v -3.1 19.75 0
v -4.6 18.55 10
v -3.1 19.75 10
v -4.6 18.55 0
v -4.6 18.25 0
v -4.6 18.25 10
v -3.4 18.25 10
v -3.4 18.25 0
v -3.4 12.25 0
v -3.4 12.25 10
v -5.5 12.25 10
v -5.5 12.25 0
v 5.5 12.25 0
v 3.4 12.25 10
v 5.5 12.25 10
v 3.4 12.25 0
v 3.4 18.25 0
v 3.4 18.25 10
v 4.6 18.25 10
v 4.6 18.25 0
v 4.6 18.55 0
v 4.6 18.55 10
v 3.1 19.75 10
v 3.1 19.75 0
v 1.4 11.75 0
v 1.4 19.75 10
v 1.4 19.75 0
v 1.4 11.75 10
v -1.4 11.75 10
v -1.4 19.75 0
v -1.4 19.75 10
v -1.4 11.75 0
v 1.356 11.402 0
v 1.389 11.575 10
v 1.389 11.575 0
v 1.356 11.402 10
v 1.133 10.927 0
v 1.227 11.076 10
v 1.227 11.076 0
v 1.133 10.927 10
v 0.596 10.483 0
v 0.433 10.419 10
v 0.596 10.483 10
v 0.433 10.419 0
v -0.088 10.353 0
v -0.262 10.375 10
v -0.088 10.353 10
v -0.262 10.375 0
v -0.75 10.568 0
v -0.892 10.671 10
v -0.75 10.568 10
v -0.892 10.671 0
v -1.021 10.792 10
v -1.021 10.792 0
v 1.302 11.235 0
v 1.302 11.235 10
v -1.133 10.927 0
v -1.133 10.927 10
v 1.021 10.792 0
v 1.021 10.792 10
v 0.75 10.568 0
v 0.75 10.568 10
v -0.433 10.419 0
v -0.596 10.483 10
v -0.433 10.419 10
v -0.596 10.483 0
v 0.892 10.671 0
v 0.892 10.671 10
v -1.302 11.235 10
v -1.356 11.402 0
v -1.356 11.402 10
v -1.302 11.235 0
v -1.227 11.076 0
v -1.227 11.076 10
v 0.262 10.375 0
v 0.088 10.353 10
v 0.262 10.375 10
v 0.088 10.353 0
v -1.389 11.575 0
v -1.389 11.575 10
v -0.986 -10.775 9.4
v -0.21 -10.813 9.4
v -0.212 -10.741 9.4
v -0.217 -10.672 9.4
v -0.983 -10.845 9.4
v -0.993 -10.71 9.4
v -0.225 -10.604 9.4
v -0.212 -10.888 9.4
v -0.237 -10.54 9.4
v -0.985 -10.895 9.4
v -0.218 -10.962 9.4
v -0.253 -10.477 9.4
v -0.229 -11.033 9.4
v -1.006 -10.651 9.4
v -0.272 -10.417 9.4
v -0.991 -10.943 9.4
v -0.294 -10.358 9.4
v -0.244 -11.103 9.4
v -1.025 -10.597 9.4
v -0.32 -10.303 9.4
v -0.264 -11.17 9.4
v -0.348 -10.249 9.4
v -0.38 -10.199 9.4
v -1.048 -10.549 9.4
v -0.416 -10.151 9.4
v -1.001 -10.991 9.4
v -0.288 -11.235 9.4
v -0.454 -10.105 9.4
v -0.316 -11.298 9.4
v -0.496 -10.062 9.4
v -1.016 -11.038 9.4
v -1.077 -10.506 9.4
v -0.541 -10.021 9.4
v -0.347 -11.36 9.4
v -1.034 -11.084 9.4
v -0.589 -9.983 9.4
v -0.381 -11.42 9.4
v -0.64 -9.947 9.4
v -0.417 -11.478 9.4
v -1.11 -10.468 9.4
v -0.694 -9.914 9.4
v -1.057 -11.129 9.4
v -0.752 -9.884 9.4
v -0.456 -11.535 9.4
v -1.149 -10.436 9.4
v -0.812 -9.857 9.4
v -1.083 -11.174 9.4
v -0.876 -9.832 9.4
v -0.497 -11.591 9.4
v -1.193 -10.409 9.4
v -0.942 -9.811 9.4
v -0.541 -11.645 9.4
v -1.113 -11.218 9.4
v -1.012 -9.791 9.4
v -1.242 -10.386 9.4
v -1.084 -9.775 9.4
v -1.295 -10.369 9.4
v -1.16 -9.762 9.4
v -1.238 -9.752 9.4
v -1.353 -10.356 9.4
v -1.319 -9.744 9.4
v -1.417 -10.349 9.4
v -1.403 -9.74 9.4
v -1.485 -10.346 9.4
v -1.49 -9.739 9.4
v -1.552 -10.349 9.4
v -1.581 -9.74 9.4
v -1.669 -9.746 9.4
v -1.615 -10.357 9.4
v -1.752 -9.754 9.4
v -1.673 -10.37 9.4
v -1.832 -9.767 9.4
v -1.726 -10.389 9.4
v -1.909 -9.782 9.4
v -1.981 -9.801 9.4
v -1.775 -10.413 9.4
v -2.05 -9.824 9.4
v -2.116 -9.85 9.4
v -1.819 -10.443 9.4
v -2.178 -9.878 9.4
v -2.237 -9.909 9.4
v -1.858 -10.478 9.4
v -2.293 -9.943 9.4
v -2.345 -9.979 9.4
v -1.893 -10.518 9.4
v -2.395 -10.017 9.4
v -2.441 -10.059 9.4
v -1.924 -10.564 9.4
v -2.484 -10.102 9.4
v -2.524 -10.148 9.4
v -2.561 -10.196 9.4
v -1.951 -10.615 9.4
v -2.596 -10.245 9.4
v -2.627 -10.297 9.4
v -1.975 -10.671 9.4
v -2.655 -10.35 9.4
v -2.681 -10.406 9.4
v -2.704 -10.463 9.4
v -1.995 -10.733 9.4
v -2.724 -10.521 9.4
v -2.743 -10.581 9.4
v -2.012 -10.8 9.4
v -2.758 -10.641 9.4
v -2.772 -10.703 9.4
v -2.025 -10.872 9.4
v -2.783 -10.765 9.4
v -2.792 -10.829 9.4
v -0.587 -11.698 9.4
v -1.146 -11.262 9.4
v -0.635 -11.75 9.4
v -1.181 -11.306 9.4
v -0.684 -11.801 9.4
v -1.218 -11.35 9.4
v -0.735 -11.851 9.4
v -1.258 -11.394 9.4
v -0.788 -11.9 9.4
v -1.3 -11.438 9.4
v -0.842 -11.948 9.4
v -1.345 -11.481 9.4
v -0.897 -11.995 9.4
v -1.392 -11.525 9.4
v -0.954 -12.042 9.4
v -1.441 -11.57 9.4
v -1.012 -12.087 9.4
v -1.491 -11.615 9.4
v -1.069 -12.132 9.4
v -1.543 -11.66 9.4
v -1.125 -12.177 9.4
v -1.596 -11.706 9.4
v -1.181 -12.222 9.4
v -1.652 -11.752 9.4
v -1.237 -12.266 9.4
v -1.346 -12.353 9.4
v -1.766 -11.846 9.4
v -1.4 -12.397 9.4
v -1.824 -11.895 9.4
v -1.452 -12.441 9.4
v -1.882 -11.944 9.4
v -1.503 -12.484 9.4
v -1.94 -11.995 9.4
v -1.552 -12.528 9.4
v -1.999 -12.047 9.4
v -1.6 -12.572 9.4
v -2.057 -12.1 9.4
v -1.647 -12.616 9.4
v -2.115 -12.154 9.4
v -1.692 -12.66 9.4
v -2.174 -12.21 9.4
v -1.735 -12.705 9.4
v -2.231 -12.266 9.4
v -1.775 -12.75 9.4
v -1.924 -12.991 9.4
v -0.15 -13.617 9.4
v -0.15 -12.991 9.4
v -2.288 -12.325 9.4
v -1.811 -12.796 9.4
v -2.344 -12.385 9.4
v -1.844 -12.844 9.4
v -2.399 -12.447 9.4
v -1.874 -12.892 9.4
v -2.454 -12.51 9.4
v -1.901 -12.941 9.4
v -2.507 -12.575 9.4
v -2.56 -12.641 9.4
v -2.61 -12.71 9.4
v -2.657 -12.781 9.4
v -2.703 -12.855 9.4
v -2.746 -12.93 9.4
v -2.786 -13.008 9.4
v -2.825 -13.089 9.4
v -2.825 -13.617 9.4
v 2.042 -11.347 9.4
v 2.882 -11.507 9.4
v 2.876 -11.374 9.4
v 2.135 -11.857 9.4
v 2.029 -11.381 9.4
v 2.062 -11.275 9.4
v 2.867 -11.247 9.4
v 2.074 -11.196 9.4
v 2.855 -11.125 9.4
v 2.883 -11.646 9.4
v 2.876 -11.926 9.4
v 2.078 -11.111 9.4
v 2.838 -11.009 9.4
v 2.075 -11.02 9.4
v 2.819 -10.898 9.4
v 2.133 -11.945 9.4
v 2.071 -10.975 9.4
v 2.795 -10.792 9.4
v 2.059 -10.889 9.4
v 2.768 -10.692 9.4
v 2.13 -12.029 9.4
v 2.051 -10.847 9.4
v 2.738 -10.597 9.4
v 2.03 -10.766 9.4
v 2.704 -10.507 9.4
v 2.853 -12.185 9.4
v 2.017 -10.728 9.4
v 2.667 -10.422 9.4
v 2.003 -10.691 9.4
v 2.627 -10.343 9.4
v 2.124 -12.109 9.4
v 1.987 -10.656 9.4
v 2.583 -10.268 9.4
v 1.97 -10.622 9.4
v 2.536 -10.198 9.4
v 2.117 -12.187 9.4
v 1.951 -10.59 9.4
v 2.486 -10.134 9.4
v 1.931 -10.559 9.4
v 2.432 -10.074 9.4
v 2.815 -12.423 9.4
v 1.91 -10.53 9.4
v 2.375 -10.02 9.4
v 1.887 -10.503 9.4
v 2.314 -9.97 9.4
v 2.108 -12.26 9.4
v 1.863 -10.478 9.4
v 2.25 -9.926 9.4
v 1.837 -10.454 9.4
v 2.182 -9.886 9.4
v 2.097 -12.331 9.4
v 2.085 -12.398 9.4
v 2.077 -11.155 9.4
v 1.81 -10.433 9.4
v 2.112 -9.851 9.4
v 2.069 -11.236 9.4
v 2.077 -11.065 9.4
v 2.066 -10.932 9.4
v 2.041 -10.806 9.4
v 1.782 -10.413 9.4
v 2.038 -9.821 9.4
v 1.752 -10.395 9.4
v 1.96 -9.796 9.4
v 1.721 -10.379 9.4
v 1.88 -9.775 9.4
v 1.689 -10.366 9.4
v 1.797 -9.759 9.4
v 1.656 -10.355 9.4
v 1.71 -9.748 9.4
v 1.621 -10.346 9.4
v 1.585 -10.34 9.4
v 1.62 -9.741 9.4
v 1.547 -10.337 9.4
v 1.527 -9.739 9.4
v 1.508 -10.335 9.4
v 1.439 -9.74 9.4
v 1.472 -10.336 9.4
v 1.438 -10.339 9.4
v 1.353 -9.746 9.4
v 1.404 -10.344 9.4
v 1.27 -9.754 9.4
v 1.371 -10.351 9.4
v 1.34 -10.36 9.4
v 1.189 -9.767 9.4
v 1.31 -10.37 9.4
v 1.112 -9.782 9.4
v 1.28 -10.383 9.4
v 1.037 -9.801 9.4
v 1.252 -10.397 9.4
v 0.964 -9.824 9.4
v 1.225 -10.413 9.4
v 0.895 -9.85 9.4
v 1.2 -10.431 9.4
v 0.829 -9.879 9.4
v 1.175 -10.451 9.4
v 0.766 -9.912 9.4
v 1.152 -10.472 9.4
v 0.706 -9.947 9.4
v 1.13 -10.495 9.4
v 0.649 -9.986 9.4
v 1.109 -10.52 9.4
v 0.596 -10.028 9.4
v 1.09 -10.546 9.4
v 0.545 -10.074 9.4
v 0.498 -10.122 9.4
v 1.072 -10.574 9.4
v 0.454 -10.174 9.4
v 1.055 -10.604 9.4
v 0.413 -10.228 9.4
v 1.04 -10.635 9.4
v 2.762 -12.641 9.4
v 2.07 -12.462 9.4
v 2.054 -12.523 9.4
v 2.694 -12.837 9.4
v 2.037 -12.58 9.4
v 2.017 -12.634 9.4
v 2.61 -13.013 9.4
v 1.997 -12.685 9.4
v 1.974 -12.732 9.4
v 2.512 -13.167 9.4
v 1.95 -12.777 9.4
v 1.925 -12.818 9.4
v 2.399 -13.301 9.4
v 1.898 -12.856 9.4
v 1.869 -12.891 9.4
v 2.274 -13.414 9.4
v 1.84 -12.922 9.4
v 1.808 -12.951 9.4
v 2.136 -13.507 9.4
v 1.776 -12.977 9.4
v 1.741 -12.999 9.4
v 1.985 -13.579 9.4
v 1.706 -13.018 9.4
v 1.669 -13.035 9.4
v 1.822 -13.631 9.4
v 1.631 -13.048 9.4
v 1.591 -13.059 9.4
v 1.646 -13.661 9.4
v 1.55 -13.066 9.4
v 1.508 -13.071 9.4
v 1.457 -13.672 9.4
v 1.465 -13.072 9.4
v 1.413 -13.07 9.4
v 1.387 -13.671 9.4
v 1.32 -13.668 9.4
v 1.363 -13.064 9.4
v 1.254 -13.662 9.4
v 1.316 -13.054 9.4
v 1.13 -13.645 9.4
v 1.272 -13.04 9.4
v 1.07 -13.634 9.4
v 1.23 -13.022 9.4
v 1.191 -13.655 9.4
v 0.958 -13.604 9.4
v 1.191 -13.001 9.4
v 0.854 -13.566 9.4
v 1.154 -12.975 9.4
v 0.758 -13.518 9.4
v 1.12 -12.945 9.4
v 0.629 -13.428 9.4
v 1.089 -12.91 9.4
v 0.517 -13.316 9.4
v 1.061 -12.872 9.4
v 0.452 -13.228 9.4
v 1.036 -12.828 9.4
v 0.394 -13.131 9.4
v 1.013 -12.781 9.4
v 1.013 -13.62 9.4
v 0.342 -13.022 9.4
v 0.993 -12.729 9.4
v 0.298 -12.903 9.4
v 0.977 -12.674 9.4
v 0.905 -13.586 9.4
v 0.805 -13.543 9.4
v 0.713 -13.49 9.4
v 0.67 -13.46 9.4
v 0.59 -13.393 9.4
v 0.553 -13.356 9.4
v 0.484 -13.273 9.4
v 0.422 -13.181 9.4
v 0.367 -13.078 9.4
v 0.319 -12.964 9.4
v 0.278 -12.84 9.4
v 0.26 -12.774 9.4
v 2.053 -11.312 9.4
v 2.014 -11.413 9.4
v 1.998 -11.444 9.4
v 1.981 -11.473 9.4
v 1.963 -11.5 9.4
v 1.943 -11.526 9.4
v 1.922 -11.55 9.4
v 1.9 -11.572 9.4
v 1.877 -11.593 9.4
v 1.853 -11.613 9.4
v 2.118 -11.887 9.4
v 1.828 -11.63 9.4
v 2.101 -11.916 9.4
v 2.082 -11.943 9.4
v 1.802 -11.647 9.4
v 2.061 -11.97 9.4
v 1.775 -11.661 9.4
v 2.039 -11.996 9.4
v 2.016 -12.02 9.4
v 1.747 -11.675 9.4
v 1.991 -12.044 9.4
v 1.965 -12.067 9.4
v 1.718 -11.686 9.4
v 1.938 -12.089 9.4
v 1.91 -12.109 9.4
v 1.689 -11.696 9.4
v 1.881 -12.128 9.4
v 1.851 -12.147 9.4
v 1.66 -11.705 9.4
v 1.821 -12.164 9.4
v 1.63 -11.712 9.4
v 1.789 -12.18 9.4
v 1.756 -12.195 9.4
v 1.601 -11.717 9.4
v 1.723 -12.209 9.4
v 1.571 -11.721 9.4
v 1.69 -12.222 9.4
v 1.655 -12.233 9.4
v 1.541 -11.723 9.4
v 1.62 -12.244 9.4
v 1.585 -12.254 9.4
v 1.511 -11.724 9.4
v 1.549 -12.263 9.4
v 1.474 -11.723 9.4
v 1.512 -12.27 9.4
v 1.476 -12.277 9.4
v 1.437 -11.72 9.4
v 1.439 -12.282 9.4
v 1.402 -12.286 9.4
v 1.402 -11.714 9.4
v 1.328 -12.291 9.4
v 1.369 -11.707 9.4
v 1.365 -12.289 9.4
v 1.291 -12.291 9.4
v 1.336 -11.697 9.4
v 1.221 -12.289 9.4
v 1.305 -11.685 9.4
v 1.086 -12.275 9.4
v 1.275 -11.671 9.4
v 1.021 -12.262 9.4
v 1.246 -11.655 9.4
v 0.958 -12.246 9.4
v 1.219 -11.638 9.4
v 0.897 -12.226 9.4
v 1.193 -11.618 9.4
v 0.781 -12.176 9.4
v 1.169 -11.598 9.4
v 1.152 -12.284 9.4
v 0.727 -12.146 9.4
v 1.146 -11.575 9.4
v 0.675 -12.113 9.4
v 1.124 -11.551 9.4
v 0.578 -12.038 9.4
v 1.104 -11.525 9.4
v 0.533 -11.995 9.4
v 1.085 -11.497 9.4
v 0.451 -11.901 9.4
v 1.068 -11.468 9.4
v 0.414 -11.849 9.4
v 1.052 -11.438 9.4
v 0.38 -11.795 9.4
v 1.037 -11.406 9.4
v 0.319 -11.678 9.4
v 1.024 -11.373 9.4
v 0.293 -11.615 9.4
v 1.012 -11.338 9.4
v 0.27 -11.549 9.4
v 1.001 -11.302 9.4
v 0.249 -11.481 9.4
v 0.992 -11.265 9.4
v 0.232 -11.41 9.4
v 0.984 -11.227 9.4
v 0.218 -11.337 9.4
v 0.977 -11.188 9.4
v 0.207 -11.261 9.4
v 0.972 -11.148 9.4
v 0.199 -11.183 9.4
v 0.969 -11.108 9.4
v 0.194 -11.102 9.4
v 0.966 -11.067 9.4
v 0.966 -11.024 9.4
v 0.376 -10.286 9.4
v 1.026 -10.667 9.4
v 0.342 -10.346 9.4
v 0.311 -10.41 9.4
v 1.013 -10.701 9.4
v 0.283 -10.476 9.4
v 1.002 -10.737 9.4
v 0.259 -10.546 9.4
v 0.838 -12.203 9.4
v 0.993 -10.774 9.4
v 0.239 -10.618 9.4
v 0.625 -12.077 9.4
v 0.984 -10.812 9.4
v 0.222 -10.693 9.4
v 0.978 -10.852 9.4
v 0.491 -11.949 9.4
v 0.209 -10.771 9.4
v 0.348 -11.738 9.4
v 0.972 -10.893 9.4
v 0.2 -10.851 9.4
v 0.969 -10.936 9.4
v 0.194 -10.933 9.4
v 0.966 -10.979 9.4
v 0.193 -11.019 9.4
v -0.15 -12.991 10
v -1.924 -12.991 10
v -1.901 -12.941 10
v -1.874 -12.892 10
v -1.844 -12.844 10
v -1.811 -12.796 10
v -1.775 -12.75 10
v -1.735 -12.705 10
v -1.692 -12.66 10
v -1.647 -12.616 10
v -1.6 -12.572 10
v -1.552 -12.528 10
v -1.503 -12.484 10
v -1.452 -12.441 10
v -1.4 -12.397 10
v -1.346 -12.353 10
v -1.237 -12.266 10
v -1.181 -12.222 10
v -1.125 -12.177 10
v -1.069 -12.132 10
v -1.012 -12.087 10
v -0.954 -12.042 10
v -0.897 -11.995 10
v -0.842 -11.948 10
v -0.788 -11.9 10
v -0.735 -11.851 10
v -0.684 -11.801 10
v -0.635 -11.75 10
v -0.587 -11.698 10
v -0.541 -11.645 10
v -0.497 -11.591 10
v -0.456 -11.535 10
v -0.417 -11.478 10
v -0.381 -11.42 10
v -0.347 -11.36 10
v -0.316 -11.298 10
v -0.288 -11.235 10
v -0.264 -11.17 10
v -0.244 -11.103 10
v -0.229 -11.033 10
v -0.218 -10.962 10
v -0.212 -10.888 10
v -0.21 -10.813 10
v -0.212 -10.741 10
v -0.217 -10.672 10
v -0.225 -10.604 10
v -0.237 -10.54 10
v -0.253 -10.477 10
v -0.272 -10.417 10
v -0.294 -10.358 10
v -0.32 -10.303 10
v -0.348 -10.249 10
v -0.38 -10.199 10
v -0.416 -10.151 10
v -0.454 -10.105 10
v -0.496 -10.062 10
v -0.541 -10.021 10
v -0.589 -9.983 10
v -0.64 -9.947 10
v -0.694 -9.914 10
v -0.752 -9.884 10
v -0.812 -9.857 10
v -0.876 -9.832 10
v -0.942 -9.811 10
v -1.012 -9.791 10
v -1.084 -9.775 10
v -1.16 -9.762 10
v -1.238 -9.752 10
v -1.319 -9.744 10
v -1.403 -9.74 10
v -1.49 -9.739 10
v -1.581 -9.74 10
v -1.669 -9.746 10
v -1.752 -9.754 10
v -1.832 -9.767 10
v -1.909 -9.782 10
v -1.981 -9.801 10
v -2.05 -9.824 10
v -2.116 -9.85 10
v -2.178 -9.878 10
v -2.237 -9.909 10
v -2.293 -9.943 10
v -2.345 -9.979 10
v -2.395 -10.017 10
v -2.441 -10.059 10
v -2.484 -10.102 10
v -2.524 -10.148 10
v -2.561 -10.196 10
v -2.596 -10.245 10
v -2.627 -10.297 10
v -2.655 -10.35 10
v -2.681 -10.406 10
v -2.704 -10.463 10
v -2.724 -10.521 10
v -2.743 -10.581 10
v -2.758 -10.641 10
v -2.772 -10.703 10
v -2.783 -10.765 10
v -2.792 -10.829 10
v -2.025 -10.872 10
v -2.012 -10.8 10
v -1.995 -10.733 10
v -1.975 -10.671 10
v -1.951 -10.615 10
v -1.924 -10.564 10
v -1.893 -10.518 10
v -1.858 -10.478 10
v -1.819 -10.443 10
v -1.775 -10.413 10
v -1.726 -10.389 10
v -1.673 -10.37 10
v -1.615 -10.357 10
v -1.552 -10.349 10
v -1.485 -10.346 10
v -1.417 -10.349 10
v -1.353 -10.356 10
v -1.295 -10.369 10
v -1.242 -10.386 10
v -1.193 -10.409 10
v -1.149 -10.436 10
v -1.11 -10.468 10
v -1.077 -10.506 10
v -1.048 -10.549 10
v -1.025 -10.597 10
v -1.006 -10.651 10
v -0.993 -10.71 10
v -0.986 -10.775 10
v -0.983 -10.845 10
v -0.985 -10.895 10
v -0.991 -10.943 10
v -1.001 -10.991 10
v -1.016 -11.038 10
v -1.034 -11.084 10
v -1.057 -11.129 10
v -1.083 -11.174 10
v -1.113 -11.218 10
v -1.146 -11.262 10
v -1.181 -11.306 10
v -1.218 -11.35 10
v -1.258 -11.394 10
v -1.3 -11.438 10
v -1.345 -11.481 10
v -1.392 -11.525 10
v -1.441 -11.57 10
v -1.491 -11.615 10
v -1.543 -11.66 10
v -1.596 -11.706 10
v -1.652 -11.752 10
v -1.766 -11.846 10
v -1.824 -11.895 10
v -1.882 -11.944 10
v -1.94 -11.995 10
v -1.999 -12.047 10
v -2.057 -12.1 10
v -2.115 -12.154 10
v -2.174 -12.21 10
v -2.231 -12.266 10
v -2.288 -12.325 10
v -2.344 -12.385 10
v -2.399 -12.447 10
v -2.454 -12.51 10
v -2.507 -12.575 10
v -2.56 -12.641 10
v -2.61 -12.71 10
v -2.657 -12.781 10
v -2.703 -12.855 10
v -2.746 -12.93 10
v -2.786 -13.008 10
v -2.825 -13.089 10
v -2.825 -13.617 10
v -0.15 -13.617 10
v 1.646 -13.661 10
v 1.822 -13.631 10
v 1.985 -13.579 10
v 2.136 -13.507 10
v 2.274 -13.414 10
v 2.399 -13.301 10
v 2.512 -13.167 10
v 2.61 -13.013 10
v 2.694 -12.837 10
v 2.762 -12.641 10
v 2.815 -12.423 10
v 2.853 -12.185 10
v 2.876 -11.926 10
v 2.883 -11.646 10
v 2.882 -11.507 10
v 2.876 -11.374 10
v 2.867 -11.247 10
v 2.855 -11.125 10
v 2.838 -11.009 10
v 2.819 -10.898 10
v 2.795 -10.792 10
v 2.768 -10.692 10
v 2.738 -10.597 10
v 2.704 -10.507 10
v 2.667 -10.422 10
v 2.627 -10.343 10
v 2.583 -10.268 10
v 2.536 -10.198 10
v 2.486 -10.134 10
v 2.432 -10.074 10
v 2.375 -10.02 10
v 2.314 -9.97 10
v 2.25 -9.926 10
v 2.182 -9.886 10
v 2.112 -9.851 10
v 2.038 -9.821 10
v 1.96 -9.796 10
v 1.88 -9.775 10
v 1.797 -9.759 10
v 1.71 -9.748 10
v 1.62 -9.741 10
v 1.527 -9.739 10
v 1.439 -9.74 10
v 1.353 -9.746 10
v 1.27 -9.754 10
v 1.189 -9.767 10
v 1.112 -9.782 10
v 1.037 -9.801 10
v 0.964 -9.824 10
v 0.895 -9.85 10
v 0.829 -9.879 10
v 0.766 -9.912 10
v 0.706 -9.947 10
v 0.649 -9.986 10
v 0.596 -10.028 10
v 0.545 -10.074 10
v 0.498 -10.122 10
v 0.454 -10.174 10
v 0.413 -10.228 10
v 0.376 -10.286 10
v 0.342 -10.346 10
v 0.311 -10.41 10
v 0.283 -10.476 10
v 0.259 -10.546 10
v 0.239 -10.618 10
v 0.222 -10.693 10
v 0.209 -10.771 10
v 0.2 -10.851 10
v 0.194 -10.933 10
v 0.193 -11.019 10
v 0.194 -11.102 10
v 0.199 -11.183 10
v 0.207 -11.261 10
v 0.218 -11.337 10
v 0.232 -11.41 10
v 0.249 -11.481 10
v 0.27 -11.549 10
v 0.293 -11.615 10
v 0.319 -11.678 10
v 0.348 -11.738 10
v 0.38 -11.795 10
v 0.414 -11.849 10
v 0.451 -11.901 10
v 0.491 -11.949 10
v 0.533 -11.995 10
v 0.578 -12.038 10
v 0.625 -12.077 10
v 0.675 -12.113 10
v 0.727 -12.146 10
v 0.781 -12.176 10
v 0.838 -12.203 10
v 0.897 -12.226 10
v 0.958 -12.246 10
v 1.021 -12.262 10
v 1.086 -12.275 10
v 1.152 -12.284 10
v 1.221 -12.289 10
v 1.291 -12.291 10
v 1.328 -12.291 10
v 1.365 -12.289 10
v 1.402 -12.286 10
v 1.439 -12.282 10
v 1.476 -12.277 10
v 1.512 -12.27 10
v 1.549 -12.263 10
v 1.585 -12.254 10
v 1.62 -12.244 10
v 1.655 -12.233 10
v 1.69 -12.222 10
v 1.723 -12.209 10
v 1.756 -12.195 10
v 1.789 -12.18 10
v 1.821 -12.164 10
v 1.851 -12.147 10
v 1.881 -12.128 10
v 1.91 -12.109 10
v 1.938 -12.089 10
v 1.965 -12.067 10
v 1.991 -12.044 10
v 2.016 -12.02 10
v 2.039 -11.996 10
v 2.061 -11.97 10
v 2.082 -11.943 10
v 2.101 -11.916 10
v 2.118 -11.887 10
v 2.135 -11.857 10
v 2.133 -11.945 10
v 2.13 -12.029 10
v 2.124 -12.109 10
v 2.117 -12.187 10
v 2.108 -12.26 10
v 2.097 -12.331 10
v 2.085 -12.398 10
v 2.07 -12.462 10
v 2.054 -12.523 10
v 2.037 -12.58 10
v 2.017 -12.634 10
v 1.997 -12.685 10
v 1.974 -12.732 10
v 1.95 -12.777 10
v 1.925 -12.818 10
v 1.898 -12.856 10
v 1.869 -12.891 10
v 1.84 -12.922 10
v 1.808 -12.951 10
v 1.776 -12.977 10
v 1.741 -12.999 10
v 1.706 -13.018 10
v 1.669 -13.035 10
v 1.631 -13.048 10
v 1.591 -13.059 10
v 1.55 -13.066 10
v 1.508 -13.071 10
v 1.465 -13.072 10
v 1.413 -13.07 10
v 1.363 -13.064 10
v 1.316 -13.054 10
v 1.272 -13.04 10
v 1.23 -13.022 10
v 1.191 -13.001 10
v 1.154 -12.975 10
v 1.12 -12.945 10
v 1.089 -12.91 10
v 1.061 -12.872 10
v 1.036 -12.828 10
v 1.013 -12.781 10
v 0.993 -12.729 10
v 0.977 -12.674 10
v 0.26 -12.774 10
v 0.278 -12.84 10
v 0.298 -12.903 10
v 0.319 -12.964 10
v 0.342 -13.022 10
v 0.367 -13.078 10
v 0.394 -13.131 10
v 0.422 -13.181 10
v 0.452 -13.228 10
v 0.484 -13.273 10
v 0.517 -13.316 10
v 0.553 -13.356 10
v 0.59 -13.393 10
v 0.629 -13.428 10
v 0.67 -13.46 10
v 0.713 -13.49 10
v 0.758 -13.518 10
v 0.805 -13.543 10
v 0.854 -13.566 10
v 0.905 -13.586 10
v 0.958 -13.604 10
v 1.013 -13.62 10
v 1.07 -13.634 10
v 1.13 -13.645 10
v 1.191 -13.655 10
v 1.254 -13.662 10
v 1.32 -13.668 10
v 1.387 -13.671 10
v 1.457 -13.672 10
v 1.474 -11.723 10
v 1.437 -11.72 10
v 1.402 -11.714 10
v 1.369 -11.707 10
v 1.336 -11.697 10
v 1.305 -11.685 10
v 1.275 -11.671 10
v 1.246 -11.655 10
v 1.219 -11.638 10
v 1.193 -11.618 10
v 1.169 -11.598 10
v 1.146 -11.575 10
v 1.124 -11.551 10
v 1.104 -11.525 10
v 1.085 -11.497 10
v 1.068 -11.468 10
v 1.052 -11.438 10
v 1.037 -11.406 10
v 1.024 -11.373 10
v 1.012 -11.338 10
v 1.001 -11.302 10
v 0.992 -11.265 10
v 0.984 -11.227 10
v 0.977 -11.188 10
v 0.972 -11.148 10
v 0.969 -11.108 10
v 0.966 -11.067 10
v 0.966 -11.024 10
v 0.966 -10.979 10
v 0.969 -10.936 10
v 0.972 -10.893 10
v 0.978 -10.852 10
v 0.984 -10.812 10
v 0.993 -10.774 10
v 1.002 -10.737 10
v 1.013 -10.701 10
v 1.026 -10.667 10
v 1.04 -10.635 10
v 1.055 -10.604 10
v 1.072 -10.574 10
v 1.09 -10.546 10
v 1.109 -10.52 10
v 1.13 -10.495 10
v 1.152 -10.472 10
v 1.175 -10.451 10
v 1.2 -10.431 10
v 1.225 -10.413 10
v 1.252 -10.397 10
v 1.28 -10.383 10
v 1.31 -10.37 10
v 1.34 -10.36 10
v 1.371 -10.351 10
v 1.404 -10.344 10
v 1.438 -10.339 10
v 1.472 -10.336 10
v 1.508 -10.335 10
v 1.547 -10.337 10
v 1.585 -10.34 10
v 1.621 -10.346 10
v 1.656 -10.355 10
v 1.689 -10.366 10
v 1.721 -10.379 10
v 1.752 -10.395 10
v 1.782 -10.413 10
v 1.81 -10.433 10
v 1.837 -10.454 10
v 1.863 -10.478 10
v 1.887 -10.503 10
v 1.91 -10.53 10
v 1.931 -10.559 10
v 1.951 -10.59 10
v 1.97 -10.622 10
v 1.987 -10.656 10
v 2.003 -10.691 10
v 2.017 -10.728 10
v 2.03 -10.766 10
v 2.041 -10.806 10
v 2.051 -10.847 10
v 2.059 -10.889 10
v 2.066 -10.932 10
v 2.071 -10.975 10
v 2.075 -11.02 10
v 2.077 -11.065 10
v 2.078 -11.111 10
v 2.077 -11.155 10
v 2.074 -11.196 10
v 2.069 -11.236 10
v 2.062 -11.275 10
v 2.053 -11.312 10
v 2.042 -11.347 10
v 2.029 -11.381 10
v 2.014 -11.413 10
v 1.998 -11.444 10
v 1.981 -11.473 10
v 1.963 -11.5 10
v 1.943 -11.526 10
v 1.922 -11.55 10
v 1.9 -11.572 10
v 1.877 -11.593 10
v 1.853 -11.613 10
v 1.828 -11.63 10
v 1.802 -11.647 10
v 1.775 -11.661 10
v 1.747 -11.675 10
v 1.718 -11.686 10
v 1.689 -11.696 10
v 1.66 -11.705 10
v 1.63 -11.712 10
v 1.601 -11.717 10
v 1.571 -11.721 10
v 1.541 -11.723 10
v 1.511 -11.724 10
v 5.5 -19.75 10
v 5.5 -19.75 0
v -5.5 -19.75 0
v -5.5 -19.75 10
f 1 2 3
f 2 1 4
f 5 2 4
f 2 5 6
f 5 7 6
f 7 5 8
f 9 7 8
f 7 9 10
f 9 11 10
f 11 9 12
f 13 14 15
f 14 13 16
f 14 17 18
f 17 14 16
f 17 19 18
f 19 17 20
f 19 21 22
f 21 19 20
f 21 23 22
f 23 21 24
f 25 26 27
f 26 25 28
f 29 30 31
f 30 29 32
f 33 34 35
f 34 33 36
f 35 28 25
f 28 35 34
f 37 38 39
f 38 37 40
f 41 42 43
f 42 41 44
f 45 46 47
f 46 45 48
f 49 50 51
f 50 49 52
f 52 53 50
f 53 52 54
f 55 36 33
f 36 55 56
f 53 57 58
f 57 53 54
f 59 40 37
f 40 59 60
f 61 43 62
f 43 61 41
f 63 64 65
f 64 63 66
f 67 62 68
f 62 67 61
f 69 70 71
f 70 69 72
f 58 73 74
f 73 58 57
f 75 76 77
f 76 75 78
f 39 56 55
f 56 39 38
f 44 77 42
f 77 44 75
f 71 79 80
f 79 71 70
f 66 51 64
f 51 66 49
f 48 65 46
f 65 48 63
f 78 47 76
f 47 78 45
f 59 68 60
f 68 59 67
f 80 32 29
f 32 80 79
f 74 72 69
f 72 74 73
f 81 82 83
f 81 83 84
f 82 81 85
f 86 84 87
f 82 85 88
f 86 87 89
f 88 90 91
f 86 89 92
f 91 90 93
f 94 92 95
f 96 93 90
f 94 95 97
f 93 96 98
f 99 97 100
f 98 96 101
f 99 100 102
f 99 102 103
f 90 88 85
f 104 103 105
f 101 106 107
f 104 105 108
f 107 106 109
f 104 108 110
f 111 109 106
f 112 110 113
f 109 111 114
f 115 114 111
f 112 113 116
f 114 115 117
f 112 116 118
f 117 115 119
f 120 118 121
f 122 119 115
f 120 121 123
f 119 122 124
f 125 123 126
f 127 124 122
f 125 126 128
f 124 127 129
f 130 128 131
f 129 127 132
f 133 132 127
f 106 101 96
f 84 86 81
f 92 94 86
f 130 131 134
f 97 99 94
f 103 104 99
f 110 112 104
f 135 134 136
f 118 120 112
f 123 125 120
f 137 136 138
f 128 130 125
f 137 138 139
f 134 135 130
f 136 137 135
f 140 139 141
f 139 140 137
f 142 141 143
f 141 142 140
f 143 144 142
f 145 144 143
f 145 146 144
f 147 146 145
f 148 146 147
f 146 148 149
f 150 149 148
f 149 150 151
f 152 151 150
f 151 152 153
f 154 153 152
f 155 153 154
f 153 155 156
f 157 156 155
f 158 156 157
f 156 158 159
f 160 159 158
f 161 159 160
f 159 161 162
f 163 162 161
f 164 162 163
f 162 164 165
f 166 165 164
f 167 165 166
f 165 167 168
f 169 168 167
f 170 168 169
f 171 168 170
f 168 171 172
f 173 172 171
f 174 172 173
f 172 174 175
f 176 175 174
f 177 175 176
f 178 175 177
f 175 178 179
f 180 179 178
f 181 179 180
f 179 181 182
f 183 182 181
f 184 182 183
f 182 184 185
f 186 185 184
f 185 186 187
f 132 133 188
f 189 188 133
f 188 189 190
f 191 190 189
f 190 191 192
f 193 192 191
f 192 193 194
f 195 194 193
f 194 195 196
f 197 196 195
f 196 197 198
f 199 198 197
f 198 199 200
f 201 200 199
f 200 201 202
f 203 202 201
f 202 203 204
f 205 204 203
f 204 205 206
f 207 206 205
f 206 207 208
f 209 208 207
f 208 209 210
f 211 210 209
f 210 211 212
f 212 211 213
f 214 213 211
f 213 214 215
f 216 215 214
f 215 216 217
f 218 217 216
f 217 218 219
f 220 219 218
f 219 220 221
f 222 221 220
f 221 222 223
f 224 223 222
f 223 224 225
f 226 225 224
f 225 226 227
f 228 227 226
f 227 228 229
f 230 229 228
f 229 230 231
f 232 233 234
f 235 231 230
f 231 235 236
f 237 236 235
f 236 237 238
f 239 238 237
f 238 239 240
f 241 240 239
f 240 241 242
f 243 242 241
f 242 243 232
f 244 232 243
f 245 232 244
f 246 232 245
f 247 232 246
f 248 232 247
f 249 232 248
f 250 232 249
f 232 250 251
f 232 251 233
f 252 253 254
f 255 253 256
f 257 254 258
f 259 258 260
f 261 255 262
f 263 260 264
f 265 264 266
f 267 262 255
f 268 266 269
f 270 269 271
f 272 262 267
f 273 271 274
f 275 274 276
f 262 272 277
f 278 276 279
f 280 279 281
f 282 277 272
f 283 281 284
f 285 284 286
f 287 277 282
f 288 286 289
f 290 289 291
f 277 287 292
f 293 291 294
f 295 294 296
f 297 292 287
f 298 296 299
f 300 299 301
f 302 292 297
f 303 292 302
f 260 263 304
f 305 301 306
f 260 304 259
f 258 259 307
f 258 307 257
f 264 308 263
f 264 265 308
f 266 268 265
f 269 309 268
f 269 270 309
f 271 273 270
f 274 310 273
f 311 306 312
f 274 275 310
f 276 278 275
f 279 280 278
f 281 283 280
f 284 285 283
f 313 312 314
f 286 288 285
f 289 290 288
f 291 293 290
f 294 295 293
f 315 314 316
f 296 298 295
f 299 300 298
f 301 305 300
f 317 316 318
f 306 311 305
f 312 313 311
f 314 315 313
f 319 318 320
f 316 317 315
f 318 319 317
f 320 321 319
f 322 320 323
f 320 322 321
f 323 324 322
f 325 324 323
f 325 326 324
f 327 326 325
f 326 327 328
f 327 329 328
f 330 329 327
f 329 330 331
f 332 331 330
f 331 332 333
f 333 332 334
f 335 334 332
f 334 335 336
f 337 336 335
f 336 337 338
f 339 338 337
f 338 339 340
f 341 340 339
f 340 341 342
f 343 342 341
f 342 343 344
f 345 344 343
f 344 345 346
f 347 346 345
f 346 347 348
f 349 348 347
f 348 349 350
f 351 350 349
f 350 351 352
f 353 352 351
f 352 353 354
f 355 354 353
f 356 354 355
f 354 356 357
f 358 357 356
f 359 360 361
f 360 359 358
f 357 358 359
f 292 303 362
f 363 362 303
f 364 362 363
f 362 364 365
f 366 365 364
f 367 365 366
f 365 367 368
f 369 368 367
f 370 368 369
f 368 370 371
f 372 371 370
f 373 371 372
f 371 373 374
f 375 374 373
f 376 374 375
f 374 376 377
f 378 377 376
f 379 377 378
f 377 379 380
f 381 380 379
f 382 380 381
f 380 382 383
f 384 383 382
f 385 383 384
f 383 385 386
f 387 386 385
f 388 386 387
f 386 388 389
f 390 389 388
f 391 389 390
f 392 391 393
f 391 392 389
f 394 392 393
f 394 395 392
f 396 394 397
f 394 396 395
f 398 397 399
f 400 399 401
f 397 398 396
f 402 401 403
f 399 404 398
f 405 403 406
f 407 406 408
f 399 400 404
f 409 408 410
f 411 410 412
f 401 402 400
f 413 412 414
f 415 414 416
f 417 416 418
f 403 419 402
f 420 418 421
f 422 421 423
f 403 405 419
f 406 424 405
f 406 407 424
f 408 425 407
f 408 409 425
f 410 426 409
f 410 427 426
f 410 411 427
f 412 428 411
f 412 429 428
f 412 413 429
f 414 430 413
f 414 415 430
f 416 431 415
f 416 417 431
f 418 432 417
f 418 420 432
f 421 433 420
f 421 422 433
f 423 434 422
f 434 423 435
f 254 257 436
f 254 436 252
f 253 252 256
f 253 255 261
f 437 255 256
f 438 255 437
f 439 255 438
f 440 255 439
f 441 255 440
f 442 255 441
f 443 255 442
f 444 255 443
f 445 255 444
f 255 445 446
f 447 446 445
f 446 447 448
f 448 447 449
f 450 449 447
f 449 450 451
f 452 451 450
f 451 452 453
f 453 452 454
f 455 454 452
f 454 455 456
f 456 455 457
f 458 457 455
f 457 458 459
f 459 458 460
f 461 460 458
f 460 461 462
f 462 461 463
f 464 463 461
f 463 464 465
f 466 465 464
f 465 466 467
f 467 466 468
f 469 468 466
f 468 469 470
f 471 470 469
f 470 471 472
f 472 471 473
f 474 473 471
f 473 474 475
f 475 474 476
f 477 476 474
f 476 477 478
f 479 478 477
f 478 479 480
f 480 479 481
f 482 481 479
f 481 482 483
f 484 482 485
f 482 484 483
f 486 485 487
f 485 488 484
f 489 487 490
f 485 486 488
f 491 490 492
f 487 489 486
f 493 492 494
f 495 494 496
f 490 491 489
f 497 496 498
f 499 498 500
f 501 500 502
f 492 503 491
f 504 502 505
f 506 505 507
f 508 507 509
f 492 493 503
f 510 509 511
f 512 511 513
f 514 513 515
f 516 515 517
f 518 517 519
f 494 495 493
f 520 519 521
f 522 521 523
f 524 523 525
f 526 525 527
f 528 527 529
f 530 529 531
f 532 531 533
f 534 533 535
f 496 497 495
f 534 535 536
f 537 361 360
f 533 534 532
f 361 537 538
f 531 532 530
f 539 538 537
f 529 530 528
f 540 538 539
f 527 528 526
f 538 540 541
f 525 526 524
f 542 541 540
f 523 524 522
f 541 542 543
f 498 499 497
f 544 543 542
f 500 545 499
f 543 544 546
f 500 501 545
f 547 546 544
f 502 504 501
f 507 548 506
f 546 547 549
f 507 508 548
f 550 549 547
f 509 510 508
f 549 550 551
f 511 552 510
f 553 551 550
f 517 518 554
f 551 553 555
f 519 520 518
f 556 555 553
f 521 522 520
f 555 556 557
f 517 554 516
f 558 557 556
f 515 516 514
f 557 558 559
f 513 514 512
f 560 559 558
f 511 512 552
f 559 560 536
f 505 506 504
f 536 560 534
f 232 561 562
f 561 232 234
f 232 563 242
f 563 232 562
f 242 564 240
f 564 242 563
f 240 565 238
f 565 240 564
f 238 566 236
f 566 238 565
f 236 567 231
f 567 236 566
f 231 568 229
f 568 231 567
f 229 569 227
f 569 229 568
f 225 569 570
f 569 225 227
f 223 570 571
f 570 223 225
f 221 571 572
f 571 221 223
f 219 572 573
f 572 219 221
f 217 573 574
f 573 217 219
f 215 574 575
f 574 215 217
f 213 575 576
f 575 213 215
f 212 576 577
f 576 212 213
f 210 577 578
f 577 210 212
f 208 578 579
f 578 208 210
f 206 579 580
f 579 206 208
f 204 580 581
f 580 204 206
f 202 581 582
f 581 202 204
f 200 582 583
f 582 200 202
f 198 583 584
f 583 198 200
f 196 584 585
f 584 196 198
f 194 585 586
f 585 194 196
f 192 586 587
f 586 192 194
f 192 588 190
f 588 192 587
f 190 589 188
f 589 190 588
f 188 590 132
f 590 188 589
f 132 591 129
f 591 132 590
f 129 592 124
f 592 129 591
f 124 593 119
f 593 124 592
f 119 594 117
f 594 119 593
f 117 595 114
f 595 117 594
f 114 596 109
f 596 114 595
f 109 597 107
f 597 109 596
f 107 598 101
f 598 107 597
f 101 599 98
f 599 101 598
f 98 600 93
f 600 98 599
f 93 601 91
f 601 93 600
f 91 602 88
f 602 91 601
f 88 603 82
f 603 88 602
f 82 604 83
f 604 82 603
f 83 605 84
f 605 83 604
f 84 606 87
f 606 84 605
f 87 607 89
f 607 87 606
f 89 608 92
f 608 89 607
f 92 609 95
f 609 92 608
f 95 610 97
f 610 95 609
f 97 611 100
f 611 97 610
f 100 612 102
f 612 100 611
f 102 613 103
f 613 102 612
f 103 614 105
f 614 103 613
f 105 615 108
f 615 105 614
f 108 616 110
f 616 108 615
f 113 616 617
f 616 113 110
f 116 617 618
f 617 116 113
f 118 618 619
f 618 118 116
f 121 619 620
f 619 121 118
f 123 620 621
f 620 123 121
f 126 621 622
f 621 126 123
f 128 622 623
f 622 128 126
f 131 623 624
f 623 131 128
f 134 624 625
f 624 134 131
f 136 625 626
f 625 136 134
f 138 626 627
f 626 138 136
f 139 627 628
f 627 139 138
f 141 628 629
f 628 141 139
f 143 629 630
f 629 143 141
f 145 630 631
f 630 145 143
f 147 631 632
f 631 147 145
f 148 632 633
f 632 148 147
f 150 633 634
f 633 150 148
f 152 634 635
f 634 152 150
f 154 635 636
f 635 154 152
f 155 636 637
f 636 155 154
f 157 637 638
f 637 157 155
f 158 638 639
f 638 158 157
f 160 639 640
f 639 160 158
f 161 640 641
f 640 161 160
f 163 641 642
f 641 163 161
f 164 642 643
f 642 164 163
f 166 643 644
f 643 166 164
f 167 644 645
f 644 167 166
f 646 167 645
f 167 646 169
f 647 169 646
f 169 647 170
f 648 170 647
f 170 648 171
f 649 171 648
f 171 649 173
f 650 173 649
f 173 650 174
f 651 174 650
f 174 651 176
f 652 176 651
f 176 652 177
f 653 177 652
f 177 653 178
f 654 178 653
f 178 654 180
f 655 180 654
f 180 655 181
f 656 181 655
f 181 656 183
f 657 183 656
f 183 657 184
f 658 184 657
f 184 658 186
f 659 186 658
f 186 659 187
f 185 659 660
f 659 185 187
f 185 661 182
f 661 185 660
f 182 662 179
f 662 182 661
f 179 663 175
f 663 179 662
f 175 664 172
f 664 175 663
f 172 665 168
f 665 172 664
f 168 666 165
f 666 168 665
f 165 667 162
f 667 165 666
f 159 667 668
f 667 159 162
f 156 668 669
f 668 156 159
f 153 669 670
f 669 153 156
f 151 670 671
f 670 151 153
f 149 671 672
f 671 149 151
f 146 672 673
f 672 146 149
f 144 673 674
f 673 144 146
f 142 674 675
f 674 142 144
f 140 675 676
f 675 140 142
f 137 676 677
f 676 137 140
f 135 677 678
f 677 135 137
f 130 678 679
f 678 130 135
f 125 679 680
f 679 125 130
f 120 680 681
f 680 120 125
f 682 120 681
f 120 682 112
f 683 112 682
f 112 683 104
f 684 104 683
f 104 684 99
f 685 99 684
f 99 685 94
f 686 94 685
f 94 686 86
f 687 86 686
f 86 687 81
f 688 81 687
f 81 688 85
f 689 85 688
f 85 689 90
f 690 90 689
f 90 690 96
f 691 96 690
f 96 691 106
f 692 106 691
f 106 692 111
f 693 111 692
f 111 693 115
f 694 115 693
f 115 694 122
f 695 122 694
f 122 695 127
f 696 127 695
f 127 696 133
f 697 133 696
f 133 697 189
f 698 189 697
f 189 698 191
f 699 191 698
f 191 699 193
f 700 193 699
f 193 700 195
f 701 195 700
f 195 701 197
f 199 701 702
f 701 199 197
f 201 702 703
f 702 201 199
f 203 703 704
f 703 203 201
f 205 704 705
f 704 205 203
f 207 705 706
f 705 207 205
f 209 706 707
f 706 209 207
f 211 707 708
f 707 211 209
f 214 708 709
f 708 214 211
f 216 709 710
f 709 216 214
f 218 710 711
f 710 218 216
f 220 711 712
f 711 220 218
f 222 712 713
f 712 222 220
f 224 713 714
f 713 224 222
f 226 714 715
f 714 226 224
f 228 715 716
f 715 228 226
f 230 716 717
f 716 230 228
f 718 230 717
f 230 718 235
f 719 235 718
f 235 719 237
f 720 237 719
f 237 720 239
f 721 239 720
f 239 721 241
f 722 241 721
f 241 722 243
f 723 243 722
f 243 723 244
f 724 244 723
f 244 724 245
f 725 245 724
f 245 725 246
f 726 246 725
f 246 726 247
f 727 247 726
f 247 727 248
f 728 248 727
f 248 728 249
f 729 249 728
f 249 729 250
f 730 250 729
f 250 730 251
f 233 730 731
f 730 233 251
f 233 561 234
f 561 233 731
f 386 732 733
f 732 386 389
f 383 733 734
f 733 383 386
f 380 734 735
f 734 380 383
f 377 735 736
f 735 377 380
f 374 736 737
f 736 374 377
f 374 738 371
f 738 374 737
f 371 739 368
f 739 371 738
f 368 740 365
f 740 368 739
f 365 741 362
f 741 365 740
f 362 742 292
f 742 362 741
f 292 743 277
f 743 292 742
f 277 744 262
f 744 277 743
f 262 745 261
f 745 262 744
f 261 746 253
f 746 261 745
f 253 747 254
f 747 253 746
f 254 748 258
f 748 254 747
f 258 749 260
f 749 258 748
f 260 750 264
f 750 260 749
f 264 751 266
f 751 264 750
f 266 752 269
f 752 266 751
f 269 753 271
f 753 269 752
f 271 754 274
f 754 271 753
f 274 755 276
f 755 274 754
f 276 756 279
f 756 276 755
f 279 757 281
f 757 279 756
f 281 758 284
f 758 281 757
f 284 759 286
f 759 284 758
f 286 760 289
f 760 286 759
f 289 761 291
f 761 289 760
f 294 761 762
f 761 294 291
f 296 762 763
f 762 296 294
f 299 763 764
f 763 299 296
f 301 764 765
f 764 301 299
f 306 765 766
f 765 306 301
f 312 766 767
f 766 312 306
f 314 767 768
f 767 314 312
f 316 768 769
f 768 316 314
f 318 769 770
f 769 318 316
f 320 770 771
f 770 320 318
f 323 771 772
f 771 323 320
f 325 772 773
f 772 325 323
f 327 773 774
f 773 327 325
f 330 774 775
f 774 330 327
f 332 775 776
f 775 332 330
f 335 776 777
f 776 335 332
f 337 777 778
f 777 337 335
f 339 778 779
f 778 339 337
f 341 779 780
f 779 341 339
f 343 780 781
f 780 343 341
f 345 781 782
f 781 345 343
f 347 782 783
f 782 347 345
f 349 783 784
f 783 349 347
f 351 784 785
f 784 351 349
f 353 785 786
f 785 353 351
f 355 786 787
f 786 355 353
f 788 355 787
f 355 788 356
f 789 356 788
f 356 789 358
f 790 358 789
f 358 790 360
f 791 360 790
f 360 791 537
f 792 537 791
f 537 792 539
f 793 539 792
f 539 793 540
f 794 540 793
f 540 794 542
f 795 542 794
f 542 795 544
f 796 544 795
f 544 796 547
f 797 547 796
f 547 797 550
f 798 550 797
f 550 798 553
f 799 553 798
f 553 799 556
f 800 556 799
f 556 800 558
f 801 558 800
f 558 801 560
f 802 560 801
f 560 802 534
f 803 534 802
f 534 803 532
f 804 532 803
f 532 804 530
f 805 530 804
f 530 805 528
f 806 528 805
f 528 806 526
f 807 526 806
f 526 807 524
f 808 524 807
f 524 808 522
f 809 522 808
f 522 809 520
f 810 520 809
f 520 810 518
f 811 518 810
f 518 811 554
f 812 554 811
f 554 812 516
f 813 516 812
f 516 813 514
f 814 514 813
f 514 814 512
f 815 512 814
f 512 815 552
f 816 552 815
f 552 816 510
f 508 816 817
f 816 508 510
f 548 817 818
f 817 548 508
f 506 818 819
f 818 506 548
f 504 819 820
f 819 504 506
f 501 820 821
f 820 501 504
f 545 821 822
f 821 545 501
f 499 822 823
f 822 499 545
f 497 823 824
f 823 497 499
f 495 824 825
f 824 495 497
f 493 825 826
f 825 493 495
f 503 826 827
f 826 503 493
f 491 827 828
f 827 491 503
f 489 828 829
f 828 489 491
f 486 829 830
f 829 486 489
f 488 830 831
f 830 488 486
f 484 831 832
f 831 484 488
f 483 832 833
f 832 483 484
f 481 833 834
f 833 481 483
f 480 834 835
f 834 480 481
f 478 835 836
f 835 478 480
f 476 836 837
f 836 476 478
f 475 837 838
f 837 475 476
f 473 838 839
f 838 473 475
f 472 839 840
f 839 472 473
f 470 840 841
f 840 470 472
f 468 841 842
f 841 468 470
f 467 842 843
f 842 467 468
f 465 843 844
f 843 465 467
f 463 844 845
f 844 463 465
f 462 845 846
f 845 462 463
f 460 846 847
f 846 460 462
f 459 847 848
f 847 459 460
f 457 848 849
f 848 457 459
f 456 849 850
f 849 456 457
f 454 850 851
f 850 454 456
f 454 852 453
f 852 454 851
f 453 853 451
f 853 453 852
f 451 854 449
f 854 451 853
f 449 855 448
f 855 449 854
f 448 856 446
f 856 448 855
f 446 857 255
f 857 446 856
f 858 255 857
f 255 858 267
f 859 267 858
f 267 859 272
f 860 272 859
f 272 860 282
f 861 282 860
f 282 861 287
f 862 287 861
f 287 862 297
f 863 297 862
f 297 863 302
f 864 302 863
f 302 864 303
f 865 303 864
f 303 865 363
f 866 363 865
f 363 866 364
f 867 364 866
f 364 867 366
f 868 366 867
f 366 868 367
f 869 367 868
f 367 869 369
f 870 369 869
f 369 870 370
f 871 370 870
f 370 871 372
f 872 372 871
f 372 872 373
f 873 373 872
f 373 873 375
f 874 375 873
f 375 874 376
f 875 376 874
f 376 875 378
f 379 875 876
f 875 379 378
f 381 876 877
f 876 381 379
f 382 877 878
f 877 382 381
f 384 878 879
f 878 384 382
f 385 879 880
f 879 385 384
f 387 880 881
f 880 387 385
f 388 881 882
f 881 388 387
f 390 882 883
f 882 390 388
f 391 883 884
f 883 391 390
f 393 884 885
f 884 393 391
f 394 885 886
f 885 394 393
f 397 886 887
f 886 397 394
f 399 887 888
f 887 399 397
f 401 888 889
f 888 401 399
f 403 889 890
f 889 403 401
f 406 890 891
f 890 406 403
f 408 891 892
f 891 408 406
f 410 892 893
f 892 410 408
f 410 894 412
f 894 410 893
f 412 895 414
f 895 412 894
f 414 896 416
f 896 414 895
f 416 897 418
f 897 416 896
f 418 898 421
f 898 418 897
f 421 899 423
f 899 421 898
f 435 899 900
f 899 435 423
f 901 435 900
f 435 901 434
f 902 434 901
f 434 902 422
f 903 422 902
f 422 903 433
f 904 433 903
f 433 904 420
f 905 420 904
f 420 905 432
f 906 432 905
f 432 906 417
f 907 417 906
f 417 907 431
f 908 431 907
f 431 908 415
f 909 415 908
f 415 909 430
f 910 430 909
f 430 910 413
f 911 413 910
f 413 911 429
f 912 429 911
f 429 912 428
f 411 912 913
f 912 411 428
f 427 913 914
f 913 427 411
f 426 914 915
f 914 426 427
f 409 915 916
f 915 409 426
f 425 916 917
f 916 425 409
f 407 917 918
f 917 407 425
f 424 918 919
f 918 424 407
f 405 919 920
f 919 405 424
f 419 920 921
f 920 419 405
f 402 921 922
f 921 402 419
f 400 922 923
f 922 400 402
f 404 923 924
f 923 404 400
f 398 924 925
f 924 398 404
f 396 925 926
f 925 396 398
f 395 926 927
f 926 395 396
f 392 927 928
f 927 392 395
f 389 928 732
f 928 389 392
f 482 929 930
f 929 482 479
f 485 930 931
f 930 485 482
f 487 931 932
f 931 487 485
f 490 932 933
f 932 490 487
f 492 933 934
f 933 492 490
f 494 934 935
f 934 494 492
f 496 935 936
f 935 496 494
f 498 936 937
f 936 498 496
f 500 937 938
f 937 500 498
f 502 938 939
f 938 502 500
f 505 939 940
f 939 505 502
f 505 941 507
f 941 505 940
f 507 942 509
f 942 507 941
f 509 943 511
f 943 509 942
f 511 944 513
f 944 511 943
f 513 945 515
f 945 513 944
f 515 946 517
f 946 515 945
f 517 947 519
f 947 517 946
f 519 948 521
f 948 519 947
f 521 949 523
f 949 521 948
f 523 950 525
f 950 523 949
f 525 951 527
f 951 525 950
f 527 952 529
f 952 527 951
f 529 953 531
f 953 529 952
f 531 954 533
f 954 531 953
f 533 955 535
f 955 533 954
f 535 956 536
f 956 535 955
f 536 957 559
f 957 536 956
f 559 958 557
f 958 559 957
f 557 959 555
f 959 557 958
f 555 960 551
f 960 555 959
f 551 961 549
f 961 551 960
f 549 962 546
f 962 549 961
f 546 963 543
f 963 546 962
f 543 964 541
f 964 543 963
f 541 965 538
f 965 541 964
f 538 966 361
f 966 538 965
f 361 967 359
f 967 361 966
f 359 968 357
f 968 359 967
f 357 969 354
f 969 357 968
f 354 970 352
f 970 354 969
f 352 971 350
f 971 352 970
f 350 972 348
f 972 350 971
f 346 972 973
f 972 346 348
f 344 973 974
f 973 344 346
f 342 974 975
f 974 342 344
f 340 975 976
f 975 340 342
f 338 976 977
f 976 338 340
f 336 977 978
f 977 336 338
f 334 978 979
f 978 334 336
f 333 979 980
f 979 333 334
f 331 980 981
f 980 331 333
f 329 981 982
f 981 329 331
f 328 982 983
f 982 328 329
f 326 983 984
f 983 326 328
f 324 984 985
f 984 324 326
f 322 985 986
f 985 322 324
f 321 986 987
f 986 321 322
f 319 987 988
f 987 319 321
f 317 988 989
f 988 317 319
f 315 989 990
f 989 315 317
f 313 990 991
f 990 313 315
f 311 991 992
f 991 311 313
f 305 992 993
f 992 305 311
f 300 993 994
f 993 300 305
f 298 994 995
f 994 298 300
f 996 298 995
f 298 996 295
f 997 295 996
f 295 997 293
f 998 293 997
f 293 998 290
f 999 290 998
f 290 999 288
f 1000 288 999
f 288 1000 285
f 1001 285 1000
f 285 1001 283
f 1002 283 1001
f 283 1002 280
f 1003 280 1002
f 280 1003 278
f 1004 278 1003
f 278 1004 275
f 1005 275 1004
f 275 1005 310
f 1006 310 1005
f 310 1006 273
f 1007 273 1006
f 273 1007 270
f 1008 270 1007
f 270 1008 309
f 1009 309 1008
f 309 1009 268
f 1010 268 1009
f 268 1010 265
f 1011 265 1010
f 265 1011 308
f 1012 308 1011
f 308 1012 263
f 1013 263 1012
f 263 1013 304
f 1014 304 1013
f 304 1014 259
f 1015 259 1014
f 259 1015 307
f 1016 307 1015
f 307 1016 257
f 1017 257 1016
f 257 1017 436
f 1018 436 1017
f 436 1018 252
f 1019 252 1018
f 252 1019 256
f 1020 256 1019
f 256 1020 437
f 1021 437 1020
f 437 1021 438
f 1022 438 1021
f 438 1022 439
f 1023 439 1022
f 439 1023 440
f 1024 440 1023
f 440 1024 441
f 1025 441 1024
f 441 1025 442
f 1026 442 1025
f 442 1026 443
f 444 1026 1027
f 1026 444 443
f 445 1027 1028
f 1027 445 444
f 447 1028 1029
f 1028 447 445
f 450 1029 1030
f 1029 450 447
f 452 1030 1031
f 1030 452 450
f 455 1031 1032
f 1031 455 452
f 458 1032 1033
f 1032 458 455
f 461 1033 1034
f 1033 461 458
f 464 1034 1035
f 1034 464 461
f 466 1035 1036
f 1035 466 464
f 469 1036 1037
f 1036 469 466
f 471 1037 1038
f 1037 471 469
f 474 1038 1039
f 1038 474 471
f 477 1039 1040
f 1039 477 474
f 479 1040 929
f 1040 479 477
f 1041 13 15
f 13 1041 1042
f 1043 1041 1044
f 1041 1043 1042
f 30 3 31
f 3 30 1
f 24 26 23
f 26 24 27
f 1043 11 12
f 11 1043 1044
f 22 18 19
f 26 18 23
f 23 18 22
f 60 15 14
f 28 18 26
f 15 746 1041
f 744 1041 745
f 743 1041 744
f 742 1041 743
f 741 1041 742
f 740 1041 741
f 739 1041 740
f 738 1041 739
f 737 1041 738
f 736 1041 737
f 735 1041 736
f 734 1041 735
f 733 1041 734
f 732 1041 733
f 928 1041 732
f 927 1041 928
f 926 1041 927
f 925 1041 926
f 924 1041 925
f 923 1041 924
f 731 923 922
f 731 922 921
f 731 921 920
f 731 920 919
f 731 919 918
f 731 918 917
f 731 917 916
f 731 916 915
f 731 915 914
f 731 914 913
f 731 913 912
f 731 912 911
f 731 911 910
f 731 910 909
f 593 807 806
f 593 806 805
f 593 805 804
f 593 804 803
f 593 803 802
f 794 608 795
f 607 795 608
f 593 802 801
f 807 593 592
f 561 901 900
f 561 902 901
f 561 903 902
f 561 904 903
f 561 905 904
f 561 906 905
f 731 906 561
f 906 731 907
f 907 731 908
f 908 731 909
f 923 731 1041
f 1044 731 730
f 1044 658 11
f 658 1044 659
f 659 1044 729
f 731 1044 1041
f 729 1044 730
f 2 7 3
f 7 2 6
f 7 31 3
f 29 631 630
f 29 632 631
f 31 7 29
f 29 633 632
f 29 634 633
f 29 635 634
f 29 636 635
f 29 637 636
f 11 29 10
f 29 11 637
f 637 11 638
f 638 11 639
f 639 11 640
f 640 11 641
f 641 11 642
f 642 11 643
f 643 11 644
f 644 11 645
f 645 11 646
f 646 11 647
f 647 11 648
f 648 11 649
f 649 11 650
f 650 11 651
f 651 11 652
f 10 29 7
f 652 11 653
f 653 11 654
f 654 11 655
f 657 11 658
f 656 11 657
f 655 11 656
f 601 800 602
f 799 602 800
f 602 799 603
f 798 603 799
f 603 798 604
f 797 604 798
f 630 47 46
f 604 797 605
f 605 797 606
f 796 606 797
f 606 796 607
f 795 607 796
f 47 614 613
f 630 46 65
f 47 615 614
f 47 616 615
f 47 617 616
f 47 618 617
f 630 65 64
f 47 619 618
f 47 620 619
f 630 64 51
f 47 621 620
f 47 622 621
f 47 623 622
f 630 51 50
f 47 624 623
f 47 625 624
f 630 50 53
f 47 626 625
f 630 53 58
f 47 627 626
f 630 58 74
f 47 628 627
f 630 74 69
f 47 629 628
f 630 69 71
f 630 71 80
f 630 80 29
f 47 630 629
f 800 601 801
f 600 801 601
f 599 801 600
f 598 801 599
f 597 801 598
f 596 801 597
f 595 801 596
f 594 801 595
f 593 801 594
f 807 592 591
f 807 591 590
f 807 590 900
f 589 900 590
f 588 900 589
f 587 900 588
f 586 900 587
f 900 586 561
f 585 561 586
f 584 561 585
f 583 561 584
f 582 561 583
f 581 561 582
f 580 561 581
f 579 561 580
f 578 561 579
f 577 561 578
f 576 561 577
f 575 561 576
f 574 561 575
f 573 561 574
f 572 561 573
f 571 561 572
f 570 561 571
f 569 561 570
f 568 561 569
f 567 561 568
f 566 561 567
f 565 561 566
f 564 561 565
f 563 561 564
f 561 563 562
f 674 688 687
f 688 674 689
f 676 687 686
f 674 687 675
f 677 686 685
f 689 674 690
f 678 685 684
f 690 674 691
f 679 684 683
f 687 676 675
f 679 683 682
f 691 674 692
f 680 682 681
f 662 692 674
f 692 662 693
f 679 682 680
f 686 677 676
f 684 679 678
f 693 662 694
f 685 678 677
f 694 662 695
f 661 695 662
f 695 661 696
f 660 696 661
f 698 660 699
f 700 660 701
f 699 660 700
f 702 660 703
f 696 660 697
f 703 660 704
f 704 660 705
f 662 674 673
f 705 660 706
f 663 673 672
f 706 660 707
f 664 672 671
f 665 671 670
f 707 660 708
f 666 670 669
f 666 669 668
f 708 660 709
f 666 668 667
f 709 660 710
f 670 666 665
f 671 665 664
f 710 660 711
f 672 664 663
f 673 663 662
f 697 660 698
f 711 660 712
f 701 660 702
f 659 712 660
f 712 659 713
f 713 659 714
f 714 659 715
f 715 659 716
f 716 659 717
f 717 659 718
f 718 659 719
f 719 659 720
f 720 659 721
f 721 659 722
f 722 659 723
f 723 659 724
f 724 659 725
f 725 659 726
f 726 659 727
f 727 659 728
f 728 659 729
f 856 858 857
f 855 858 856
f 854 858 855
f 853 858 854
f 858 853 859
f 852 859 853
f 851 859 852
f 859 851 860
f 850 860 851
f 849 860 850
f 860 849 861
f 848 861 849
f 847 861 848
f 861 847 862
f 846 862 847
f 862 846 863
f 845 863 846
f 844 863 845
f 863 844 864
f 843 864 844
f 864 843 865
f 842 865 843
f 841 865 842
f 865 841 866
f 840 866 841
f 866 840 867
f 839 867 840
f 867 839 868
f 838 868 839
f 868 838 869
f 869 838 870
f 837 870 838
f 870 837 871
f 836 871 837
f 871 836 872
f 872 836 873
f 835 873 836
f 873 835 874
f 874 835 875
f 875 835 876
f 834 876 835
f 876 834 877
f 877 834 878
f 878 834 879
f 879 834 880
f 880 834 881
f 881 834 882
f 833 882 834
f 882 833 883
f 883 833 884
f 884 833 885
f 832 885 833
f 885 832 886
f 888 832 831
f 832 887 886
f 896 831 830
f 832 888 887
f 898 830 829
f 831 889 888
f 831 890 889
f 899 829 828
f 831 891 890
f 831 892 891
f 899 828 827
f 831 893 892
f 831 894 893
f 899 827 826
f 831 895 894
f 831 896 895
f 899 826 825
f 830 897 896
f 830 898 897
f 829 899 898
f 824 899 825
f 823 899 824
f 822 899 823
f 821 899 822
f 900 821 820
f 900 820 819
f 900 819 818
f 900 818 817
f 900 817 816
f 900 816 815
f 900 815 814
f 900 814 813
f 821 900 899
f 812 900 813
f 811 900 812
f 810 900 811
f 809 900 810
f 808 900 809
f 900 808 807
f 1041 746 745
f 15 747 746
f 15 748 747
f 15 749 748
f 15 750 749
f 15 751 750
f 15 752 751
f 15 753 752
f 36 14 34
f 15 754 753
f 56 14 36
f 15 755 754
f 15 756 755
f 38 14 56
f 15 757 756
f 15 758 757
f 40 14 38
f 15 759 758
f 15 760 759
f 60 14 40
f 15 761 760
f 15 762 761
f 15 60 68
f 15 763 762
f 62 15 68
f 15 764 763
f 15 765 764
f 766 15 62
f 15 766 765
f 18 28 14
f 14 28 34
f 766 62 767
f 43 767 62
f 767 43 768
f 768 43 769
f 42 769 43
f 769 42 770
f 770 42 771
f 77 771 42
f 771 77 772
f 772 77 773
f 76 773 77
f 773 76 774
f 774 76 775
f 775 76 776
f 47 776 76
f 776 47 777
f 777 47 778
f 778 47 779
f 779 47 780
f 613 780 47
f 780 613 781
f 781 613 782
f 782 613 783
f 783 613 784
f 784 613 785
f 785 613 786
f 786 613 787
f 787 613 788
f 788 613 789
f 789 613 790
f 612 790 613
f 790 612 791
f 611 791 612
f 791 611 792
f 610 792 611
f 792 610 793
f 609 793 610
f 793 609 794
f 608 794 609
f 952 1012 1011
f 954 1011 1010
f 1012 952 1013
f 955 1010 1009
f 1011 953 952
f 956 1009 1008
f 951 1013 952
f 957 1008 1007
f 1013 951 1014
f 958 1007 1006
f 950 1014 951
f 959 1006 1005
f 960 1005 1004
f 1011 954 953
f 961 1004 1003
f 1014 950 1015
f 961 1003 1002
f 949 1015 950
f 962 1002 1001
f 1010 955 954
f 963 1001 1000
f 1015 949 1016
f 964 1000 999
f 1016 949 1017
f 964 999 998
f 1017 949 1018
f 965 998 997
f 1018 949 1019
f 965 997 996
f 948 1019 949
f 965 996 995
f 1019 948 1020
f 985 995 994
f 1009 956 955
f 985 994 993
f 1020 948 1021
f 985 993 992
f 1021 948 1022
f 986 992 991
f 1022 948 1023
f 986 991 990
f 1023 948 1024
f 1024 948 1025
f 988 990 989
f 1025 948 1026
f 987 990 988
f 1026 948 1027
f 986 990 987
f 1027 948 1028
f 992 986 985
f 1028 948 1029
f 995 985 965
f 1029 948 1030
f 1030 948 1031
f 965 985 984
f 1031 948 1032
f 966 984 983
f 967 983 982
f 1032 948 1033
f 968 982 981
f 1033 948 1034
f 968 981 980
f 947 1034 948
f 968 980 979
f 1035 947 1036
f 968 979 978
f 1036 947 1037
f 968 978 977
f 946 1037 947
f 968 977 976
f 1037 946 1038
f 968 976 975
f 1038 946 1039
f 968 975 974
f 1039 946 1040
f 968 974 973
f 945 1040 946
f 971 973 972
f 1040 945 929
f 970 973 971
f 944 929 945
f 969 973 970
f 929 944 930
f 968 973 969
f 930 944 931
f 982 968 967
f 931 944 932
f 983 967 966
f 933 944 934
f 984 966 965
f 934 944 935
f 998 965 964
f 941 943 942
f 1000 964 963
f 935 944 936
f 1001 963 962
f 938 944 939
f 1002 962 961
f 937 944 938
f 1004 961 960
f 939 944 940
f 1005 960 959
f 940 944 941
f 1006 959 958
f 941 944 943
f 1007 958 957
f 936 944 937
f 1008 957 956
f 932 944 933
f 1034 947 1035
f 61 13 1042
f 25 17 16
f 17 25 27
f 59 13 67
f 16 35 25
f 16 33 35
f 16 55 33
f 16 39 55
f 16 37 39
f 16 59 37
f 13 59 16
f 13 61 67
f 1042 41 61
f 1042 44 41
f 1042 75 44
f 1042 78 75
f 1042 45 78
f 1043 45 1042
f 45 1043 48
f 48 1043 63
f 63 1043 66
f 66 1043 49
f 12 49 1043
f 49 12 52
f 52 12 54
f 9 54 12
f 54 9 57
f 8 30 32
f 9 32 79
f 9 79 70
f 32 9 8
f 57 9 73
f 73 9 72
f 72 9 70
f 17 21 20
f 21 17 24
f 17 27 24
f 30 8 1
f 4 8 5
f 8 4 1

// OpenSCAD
$fn = 50;

difference() {
	union() {
		translate(v = [0, 12.25, 0]) {
			rotate(a = [90, 0, 0]) {
				difference() {
					union() {
						translate(v = [-5.5, 0, -7.5]) {
							cube(size = [11.0, 10.0, 39.5]);
						}
					}
					union() {
						translate(v = [0, 10.1, 0]) {
							rotate(a = [90, 0, 0]) {
								linear_extrude(height = 10.2) {
									polygon(points = [[-3.1, -7.6], [-3.1, -7.5], [-4.6, -6.3], [-4.6, -6.0], [-3.4, -6.0], [-3.4, 0], [-5.6, 0], [-5.6, -7.6]]);
								}
							}
						}
						translate(v = [0, 10.1, 0]) {
							rotate(a = [90, 0, 0]) {
								linear_extrude(height = 10.2) {
									polygon(points = [[3.1, -7.6], [3.1, -7.5], [4.6, -6.3], [4.6, -6.0], [3.4, -6.0], [3.4, 0], [5.6, 0], [5.6, -7.6]]);
								}
							}
						}
						translate(v = [-1.4, -0.1, -7.6]) {
							cube(size = [2.8, 10.2, 8.1]);
						}
						translate(v = [0, 10.1, 0.5]) {
							rotate(a = [90, 0, 0]) {
								cylinder(h = 10.2, r = 1.4);
							}
						}
						translate(v = [0, 9.4, 24.0]) {
							rotate(a = [-90, 0, 0]) {
								linear_extrude(height = 0.7) {
									text(font = "Arial:style=Bold", halign = "center", size = 4.0, text = "29", valign = "center");
								}
							}
						}
					}
				}
			}
		}
	}
	union();
}
